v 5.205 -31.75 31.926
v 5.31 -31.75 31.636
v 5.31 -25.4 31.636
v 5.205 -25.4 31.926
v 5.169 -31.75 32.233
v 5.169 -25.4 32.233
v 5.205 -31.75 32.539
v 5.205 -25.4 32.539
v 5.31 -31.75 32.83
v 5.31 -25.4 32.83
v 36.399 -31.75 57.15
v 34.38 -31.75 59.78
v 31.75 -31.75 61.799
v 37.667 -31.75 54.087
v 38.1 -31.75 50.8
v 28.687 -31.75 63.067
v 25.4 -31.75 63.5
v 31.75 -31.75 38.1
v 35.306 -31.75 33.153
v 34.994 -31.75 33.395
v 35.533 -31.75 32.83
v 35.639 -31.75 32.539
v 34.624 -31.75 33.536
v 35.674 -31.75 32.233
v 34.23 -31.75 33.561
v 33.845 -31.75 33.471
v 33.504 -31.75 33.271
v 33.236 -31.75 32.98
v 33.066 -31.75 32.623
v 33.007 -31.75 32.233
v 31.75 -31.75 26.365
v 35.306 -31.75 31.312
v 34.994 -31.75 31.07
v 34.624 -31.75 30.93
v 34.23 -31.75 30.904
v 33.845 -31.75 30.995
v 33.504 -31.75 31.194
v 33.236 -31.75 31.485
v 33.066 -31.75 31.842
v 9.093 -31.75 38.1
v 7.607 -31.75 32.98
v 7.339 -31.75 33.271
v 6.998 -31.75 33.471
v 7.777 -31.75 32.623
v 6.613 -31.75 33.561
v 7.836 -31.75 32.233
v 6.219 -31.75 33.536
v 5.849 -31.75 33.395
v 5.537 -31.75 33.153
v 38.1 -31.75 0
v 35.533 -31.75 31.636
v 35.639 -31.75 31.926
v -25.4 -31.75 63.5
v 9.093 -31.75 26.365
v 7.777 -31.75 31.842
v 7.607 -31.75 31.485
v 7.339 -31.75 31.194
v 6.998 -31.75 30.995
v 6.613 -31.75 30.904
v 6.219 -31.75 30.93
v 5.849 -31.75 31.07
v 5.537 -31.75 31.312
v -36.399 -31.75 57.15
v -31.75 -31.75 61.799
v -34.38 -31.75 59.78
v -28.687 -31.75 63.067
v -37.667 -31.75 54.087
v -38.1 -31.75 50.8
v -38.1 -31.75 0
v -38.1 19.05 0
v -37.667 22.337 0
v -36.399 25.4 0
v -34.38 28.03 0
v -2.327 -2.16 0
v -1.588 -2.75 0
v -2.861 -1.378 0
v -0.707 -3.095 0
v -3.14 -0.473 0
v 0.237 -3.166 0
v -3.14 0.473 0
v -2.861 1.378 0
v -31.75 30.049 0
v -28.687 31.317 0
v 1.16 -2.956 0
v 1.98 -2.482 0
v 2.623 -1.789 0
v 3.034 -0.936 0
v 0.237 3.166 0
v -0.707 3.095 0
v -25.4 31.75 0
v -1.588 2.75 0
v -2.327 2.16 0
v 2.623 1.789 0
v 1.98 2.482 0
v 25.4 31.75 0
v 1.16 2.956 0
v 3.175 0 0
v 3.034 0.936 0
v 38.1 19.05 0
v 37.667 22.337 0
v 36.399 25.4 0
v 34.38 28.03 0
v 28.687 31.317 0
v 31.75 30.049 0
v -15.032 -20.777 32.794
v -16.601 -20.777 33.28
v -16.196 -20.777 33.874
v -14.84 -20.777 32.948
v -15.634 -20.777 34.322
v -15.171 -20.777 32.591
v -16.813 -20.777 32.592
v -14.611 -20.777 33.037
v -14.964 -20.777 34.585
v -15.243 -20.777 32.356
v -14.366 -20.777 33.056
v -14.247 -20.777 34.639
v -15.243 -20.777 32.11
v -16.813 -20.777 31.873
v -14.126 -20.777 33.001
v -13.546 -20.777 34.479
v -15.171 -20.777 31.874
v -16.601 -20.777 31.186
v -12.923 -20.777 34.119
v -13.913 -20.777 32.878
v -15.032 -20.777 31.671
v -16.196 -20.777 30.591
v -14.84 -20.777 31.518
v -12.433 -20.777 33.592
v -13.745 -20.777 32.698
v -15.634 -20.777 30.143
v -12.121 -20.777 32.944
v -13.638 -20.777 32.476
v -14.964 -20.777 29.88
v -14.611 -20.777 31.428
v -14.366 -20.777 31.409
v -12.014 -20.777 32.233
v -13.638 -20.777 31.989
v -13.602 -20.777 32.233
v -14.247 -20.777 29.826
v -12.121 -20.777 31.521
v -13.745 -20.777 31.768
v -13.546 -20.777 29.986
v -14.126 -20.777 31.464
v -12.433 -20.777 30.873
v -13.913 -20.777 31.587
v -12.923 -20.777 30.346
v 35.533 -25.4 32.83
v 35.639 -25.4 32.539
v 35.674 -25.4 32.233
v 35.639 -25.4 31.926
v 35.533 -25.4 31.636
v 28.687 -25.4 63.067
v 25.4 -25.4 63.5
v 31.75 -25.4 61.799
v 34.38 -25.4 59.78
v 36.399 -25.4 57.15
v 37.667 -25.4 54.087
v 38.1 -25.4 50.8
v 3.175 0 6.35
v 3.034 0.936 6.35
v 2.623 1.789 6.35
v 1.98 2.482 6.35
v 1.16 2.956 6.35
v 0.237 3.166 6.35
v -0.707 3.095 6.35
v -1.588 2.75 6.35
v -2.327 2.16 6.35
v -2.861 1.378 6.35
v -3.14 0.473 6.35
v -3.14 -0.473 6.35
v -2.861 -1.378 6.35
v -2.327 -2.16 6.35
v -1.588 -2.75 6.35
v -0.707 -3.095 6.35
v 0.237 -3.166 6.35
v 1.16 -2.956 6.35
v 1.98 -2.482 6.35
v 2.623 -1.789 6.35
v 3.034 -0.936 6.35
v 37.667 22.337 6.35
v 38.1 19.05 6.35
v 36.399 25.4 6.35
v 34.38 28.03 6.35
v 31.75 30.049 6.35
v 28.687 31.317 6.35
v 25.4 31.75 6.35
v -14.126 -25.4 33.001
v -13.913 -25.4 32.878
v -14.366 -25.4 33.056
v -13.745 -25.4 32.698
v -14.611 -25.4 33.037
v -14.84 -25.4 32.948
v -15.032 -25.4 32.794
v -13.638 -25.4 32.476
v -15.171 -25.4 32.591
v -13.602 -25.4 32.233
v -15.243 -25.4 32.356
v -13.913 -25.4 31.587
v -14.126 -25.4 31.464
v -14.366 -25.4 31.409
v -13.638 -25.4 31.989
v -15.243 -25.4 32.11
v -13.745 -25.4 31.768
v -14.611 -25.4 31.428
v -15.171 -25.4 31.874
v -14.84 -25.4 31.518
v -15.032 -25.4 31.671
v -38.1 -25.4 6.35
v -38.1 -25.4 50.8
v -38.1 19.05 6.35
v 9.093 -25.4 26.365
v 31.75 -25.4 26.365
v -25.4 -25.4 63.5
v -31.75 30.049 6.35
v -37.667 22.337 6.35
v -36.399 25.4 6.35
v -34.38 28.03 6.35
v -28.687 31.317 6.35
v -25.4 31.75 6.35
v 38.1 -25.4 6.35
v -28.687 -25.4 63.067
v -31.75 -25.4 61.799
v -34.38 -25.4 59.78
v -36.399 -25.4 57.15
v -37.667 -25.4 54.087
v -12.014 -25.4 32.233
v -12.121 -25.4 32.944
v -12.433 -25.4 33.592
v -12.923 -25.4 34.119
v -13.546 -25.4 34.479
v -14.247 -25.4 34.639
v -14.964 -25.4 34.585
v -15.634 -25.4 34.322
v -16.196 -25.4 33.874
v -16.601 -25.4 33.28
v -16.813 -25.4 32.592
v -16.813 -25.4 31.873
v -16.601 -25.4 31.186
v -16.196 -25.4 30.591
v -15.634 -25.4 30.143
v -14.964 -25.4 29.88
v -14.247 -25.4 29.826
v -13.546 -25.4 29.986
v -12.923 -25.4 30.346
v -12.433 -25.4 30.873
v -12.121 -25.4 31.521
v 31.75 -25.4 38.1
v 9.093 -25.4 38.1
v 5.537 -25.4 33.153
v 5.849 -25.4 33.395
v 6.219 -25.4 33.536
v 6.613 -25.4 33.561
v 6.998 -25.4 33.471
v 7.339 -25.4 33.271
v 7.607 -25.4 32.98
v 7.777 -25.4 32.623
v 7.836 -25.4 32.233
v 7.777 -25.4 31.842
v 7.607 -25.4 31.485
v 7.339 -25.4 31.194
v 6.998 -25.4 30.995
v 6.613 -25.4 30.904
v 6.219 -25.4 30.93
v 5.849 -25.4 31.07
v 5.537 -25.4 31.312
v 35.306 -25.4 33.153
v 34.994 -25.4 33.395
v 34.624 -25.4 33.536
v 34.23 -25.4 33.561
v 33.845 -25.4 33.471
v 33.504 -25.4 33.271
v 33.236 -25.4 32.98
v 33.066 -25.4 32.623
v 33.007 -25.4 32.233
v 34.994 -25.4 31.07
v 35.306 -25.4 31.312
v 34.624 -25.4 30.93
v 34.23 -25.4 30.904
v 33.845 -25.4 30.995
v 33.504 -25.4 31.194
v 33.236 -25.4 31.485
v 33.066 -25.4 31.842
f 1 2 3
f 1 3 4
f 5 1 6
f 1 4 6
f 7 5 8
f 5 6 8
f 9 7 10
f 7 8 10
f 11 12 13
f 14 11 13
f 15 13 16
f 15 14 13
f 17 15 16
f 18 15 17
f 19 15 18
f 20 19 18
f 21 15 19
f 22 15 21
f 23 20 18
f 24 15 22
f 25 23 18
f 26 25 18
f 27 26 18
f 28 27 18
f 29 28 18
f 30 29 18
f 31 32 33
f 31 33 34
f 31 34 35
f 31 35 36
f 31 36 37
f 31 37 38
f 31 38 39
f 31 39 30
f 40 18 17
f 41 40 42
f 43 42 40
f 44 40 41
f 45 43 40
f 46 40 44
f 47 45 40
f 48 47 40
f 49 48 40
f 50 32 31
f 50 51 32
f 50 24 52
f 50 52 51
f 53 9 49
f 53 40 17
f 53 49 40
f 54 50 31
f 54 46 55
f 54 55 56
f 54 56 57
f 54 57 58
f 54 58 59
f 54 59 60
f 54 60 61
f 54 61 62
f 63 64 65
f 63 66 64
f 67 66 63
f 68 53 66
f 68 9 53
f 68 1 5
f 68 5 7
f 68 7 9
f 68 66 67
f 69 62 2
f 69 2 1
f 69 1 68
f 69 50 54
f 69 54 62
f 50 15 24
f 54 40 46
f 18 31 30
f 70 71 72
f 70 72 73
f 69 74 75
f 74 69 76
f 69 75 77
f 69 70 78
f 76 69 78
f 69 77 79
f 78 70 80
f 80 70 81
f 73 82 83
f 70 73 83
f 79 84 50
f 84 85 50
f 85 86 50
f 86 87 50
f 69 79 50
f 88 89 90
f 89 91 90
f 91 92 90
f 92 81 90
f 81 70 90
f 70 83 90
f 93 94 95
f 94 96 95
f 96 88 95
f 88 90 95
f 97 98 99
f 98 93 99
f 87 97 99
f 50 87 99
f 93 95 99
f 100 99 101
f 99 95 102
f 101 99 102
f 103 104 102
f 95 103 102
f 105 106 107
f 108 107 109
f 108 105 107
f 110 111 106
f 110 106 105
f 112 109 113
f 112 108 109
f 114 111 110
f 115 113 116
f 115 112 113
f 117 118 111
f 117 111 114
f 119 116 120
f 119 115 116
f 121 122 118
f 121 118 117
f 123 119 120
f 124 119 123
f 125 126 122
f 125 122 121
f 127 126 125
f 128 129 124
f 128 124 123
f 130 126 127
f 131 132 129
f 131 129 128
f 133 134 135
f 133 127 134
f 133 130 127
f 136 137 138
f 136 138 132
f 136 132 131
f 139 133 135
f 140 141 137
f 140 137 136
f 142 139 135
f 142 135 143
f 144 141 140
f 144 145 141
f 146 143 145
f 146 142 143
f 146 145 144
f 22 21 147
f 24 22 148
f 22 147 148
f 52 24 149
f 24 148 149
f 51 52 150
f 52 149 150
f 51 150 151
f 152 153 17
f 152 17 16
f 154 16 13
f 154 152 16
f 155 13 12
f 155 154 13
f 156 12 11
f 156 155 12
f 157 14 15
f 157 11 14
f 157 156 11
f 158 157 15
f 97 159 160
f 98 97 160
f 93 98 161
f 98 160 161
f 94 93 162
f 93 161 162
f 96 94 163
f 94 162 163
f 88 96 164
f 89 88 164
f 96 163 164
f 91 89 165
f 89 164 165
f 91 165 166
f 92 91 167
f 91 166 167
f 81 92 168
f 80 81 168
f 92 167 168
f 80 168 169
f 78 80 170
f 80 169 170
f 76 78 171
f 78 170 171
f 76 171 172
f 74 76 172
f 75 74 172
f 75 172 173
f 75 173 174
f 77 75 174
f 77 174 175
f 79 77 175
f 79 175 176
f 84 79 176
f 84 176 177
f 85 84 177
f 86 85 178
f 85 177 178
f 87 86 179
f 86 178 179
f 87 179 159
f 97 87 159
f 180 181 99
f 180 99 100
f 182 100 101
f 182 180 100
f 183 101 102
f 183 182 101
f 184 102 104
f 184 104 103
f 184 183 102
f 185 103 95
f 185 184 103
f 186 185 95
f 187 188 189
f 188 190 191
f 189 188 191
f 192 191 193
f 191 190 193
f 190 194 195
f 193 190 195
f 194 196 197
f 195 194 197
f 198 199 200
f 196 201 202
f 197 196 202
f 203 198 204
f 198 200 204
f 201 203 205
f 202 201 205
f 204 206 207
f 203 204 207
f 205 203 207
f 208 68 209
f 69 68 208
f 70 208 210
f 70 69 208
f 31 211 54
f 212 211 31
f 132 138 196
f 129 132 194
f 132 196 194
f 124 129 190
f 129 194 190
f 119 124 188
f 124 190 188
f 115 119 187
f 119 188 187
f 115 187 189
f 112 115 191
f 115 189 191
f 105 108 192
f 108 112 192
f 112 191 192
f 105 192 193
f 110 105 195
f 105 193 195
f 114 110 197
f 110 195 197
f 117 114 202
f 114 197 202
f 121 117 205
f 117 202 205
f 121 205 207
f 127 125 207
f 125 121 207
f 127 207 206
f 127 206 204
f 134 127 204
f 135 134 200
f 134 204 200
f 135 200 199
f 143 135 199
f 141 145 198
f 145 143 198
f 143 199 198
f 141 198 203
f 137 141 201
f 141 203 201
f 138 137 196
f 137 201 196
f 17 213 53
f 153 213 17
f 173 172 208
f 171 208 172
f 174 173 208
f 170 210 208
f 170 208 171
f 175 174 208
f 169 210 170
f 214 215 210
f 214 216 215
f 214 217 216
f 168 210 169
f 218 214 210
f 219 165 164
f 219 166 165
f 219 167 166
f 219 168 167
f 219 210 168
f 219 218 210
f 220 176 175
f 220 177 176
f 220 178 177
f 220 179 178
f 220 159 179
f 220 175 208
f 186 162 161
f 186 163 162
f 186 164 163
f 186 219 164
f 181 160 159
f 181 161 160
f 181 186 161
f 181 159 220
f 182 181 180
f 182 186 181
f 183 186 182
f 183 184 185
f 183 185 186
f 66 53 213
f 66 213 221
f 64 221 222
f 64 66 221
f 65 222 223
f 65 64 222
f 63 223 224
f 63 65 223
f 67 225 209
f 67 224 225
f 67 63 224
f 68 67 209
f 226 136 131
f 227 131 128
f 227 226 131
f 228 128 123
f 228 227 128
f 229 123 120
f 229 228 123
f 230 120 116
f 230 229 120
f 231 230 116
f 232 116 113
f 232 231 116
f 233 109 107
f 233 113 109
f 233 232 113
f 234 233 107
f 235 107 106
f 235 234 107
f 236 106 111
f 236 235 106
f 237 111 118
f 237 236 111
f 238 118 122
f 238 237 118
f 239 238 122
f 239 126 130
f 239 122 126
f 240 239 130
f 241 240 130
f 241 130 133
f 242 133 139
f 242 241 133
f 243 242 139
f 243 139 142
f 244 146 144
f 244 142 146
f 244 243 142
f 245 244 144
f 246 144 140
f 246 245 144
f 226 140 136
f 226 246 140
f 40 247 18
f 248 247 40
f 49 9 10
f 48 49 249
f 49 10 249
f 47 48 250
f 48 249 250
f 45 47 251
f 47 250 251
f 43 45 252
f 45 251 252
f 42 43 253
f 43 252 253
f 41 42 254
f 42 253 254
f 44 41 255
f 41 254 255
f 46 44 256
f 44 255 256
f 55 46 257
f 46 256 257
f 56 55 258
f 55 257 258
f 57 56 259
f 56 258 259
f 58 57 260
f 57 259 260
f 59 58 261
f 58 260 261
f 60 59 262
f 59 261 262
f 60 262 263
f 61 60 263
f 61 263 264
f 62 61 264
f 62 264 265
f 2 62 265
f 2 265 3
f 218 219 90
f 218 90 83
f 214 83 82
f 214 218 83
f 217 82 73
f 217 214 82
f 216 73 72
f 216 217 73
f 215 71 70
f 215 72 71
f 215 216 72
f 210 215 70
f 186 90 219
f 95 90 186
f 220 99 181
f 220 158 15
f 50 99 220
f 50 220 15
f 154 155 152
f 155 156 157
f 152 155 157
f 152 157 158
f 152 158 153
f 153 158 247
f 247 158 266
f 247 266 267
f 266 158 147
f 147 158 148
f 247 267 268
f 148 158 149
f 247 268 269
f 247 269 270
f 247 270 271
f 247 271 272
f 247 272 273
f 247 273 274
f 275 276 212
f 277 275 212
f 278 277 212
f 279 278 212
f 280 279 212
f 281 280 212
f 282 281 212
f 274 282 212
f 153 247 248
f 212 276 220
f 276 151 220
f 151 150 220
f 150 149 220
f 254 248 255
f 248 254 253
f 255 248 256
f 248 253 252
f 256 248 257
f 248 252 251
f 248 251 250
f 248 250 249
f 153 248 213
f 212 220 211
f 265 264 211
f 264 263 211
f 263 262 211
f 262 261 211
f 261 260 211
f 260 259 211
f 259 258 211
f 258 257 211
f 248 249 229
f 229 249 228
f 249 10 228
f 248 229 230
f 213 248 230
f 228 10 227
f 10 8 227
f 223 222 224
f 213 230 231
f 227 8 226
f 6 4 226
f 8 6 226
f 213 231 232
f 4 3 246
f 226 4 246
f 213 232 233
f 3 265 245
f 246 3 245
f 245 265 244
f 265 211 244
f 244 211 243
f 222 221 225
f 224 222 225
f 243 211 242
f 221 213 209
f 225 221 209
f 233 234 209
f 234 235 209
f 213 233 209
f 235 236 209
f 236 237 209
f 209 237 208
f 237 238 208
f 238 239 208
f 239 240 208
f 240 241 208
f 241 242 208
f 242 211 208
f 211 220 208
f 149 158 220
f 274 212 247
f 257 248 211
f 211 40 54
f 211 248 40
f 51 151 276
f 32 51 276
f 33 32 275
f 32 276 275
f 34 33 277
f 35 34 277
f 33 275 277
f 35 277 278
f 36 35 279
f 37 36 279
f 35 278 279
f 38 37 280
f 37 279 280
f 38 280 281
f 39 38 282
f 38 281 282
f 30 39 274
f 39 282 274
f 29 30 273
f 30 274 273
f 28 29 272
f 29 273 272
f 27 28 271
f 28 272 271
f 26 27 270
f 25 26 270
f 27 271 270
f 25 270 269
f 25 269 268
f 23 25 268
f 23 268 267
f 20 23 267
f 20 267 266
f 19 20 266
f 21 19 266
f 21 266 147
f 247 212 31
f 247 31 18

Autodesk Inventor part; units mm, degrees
ref_plane "YZ Plane" through (0, 0, 0) normal (1, 0, 0) x (0, 1, 0)
sketch "Sketch1" plane through (0, 0, 0) normal (0, 0, 1) x (1, 0, 0)
  line L0 (38.1, -31.75) -> (-38.1, -31.75)
  line L1 (-38.1, -31.75) -> (-38.1, 31.75)
  line L2 (-38.1, 31.75) -> (38.1, 31.75)
  line L3 (38.1, 31.75) -> (38.1, -31.75)
  line L4 (38.1, -31.75) -> (-38.1, 31.75) construction
  line L5 (-38.1, -31.75) -> (38.1, 31.75) construction
  point P0 (0, 0)
  dimension "d0" = 76.2
  dimension "d1" = 63.5
extrude "Extrusion1" add sketch "Sketch1" along normal blind 6.35
sketch "Sketch2" plane through (0, 0, 6.35) normal (0, 0, 1) x (1, 0, 0)
  line L0 (-38.1, -31.75) -> (38.1, -31.75) projected
  line L1 (38.1, -31.75) -> (38.1, 31.75) projected
  line L2 (-38.1, -31.75) -> (38.1, -31.75)
  line L3 (38.1, -31.75) -> (38.1, -25.4)
  line L4 (38.1, -25.4) -> (-38.1, -25.4)
  line L5 (-38.1, -25.4) -> (-38.1, -31.75)
  point P0 (0, 0)
  dimension "d4" = 6.35
extrude "Extrusion2" add sketch "Sketch2" along normal blind 57.15
fillet "Fillet1" radius 12.7 4 edges at (38.1, 31.75, 3.175) (-38.1, 31.75, 3.175) (38.1, -28.575, 63.5) (-38.1, -28.575, 63.5)
sketch "Sketch3" plane through (0, 0, 6.35) normal (0, 0, 1) x (1, 0, 0)
  circle A0 centre (0, 0) radius 3.175
  dimension "d8" = 6.35
extrude "Extrusion3" cut sketch "Sketch3" against normal blind 25.4
sketch "Sketch4" plane through (-38.1, -25.4, 6.35) normal (0, 1, 0) x (1, 0, 0)
  line L0 (69.85, -20.2184) -> (69.85, -31.5468) projected
  line L1 (54.1906, -20.0152) -> (69.6468, -20.0152) projected
  line L2 (47.1932, -24.362) -> (47.1932, -20.2184) projected
  line L3 (47.1932, -31.5468) -> (47.1932, -27.4032) projected
  line L4 (69.6468, -31.75) -> (54.1906, -31.75) projected
  line L5 (51.7782, -31.75) -> (47.3964, -31.75) projected
  line L6 (69.85, -31.5468) -> (69.85, -31.75)
  line L7 (69.85, -31.75) -> (69.6468, -31.75)
  line L8 (69.6468, -31.75) -> (47.1932, -31.75)
  line L9 (47.1932, -31.75) -> (47.1932, -20.0152)
  line L10 (47.1932, -20.0152) -> (69.85, -20.0152)
  line L11 (69.85, -20.0152) -> (69.85, -31.5468)
  arc A0 (73.6332, -25.2857) -> (73.6332, -26.4795) centre (72.4408, -25.8826) ccw projected
  circle A1 centre (72.4408, -25.8826) radius 1.3335
  arc A2 (43.41, -26.4795) -> (43.41, -25.2857) centre (44.6024, -25.8826) ccw projected
  circle A3 centre (44.6024, -25.8826) radius 1.3335
  point P0 (38.1, 6.35)
  point P1 (47.1932, -27.4032)
  point P2 (73.6332, -25.2857)
  point P3 (43.41, -25.2857)
  dimension "d11" = 22.6568
extrude "Extrusion4" cut sketch "Sketch4" against normal blind 25.4
sketch "Sketch5" plane through (-38.1, -25.4, 6.35) normal (0, 1, 0) x (1, 0, 0)
  circle A0 centre (23.6728, -25.8826) radius 2.413
  circle A1 centre (52.9844, -25.8826) radius 2.413 projected
  line L0 (76.2, -25.8826) -> (0, -25.8826)
  circle A2 centre (23.6728, -25.8826) radius 0.8255
  circle A3 centre (52.9844, -25.8826) radius 0.8255 projected
  point P0 (38.1, 6.35)
  dimension "d14" = 4.826
ref_plane "Work Plane1" through (12.4714, -20.7772, 29.8196) normal (0, 1, 0) x (0, 0, 1)
ref_plane "Work Plane2" through (12.4714, -20.7772, 29.8196) normal (0, 1, 0) x (0, 0, 1)
extrude "Extrusion5" add sketch "Sketch5" along normal up to surface (4.6228 mm away) contours L0 A2 A0 | A0 L0 A2
properties part number "Base"
